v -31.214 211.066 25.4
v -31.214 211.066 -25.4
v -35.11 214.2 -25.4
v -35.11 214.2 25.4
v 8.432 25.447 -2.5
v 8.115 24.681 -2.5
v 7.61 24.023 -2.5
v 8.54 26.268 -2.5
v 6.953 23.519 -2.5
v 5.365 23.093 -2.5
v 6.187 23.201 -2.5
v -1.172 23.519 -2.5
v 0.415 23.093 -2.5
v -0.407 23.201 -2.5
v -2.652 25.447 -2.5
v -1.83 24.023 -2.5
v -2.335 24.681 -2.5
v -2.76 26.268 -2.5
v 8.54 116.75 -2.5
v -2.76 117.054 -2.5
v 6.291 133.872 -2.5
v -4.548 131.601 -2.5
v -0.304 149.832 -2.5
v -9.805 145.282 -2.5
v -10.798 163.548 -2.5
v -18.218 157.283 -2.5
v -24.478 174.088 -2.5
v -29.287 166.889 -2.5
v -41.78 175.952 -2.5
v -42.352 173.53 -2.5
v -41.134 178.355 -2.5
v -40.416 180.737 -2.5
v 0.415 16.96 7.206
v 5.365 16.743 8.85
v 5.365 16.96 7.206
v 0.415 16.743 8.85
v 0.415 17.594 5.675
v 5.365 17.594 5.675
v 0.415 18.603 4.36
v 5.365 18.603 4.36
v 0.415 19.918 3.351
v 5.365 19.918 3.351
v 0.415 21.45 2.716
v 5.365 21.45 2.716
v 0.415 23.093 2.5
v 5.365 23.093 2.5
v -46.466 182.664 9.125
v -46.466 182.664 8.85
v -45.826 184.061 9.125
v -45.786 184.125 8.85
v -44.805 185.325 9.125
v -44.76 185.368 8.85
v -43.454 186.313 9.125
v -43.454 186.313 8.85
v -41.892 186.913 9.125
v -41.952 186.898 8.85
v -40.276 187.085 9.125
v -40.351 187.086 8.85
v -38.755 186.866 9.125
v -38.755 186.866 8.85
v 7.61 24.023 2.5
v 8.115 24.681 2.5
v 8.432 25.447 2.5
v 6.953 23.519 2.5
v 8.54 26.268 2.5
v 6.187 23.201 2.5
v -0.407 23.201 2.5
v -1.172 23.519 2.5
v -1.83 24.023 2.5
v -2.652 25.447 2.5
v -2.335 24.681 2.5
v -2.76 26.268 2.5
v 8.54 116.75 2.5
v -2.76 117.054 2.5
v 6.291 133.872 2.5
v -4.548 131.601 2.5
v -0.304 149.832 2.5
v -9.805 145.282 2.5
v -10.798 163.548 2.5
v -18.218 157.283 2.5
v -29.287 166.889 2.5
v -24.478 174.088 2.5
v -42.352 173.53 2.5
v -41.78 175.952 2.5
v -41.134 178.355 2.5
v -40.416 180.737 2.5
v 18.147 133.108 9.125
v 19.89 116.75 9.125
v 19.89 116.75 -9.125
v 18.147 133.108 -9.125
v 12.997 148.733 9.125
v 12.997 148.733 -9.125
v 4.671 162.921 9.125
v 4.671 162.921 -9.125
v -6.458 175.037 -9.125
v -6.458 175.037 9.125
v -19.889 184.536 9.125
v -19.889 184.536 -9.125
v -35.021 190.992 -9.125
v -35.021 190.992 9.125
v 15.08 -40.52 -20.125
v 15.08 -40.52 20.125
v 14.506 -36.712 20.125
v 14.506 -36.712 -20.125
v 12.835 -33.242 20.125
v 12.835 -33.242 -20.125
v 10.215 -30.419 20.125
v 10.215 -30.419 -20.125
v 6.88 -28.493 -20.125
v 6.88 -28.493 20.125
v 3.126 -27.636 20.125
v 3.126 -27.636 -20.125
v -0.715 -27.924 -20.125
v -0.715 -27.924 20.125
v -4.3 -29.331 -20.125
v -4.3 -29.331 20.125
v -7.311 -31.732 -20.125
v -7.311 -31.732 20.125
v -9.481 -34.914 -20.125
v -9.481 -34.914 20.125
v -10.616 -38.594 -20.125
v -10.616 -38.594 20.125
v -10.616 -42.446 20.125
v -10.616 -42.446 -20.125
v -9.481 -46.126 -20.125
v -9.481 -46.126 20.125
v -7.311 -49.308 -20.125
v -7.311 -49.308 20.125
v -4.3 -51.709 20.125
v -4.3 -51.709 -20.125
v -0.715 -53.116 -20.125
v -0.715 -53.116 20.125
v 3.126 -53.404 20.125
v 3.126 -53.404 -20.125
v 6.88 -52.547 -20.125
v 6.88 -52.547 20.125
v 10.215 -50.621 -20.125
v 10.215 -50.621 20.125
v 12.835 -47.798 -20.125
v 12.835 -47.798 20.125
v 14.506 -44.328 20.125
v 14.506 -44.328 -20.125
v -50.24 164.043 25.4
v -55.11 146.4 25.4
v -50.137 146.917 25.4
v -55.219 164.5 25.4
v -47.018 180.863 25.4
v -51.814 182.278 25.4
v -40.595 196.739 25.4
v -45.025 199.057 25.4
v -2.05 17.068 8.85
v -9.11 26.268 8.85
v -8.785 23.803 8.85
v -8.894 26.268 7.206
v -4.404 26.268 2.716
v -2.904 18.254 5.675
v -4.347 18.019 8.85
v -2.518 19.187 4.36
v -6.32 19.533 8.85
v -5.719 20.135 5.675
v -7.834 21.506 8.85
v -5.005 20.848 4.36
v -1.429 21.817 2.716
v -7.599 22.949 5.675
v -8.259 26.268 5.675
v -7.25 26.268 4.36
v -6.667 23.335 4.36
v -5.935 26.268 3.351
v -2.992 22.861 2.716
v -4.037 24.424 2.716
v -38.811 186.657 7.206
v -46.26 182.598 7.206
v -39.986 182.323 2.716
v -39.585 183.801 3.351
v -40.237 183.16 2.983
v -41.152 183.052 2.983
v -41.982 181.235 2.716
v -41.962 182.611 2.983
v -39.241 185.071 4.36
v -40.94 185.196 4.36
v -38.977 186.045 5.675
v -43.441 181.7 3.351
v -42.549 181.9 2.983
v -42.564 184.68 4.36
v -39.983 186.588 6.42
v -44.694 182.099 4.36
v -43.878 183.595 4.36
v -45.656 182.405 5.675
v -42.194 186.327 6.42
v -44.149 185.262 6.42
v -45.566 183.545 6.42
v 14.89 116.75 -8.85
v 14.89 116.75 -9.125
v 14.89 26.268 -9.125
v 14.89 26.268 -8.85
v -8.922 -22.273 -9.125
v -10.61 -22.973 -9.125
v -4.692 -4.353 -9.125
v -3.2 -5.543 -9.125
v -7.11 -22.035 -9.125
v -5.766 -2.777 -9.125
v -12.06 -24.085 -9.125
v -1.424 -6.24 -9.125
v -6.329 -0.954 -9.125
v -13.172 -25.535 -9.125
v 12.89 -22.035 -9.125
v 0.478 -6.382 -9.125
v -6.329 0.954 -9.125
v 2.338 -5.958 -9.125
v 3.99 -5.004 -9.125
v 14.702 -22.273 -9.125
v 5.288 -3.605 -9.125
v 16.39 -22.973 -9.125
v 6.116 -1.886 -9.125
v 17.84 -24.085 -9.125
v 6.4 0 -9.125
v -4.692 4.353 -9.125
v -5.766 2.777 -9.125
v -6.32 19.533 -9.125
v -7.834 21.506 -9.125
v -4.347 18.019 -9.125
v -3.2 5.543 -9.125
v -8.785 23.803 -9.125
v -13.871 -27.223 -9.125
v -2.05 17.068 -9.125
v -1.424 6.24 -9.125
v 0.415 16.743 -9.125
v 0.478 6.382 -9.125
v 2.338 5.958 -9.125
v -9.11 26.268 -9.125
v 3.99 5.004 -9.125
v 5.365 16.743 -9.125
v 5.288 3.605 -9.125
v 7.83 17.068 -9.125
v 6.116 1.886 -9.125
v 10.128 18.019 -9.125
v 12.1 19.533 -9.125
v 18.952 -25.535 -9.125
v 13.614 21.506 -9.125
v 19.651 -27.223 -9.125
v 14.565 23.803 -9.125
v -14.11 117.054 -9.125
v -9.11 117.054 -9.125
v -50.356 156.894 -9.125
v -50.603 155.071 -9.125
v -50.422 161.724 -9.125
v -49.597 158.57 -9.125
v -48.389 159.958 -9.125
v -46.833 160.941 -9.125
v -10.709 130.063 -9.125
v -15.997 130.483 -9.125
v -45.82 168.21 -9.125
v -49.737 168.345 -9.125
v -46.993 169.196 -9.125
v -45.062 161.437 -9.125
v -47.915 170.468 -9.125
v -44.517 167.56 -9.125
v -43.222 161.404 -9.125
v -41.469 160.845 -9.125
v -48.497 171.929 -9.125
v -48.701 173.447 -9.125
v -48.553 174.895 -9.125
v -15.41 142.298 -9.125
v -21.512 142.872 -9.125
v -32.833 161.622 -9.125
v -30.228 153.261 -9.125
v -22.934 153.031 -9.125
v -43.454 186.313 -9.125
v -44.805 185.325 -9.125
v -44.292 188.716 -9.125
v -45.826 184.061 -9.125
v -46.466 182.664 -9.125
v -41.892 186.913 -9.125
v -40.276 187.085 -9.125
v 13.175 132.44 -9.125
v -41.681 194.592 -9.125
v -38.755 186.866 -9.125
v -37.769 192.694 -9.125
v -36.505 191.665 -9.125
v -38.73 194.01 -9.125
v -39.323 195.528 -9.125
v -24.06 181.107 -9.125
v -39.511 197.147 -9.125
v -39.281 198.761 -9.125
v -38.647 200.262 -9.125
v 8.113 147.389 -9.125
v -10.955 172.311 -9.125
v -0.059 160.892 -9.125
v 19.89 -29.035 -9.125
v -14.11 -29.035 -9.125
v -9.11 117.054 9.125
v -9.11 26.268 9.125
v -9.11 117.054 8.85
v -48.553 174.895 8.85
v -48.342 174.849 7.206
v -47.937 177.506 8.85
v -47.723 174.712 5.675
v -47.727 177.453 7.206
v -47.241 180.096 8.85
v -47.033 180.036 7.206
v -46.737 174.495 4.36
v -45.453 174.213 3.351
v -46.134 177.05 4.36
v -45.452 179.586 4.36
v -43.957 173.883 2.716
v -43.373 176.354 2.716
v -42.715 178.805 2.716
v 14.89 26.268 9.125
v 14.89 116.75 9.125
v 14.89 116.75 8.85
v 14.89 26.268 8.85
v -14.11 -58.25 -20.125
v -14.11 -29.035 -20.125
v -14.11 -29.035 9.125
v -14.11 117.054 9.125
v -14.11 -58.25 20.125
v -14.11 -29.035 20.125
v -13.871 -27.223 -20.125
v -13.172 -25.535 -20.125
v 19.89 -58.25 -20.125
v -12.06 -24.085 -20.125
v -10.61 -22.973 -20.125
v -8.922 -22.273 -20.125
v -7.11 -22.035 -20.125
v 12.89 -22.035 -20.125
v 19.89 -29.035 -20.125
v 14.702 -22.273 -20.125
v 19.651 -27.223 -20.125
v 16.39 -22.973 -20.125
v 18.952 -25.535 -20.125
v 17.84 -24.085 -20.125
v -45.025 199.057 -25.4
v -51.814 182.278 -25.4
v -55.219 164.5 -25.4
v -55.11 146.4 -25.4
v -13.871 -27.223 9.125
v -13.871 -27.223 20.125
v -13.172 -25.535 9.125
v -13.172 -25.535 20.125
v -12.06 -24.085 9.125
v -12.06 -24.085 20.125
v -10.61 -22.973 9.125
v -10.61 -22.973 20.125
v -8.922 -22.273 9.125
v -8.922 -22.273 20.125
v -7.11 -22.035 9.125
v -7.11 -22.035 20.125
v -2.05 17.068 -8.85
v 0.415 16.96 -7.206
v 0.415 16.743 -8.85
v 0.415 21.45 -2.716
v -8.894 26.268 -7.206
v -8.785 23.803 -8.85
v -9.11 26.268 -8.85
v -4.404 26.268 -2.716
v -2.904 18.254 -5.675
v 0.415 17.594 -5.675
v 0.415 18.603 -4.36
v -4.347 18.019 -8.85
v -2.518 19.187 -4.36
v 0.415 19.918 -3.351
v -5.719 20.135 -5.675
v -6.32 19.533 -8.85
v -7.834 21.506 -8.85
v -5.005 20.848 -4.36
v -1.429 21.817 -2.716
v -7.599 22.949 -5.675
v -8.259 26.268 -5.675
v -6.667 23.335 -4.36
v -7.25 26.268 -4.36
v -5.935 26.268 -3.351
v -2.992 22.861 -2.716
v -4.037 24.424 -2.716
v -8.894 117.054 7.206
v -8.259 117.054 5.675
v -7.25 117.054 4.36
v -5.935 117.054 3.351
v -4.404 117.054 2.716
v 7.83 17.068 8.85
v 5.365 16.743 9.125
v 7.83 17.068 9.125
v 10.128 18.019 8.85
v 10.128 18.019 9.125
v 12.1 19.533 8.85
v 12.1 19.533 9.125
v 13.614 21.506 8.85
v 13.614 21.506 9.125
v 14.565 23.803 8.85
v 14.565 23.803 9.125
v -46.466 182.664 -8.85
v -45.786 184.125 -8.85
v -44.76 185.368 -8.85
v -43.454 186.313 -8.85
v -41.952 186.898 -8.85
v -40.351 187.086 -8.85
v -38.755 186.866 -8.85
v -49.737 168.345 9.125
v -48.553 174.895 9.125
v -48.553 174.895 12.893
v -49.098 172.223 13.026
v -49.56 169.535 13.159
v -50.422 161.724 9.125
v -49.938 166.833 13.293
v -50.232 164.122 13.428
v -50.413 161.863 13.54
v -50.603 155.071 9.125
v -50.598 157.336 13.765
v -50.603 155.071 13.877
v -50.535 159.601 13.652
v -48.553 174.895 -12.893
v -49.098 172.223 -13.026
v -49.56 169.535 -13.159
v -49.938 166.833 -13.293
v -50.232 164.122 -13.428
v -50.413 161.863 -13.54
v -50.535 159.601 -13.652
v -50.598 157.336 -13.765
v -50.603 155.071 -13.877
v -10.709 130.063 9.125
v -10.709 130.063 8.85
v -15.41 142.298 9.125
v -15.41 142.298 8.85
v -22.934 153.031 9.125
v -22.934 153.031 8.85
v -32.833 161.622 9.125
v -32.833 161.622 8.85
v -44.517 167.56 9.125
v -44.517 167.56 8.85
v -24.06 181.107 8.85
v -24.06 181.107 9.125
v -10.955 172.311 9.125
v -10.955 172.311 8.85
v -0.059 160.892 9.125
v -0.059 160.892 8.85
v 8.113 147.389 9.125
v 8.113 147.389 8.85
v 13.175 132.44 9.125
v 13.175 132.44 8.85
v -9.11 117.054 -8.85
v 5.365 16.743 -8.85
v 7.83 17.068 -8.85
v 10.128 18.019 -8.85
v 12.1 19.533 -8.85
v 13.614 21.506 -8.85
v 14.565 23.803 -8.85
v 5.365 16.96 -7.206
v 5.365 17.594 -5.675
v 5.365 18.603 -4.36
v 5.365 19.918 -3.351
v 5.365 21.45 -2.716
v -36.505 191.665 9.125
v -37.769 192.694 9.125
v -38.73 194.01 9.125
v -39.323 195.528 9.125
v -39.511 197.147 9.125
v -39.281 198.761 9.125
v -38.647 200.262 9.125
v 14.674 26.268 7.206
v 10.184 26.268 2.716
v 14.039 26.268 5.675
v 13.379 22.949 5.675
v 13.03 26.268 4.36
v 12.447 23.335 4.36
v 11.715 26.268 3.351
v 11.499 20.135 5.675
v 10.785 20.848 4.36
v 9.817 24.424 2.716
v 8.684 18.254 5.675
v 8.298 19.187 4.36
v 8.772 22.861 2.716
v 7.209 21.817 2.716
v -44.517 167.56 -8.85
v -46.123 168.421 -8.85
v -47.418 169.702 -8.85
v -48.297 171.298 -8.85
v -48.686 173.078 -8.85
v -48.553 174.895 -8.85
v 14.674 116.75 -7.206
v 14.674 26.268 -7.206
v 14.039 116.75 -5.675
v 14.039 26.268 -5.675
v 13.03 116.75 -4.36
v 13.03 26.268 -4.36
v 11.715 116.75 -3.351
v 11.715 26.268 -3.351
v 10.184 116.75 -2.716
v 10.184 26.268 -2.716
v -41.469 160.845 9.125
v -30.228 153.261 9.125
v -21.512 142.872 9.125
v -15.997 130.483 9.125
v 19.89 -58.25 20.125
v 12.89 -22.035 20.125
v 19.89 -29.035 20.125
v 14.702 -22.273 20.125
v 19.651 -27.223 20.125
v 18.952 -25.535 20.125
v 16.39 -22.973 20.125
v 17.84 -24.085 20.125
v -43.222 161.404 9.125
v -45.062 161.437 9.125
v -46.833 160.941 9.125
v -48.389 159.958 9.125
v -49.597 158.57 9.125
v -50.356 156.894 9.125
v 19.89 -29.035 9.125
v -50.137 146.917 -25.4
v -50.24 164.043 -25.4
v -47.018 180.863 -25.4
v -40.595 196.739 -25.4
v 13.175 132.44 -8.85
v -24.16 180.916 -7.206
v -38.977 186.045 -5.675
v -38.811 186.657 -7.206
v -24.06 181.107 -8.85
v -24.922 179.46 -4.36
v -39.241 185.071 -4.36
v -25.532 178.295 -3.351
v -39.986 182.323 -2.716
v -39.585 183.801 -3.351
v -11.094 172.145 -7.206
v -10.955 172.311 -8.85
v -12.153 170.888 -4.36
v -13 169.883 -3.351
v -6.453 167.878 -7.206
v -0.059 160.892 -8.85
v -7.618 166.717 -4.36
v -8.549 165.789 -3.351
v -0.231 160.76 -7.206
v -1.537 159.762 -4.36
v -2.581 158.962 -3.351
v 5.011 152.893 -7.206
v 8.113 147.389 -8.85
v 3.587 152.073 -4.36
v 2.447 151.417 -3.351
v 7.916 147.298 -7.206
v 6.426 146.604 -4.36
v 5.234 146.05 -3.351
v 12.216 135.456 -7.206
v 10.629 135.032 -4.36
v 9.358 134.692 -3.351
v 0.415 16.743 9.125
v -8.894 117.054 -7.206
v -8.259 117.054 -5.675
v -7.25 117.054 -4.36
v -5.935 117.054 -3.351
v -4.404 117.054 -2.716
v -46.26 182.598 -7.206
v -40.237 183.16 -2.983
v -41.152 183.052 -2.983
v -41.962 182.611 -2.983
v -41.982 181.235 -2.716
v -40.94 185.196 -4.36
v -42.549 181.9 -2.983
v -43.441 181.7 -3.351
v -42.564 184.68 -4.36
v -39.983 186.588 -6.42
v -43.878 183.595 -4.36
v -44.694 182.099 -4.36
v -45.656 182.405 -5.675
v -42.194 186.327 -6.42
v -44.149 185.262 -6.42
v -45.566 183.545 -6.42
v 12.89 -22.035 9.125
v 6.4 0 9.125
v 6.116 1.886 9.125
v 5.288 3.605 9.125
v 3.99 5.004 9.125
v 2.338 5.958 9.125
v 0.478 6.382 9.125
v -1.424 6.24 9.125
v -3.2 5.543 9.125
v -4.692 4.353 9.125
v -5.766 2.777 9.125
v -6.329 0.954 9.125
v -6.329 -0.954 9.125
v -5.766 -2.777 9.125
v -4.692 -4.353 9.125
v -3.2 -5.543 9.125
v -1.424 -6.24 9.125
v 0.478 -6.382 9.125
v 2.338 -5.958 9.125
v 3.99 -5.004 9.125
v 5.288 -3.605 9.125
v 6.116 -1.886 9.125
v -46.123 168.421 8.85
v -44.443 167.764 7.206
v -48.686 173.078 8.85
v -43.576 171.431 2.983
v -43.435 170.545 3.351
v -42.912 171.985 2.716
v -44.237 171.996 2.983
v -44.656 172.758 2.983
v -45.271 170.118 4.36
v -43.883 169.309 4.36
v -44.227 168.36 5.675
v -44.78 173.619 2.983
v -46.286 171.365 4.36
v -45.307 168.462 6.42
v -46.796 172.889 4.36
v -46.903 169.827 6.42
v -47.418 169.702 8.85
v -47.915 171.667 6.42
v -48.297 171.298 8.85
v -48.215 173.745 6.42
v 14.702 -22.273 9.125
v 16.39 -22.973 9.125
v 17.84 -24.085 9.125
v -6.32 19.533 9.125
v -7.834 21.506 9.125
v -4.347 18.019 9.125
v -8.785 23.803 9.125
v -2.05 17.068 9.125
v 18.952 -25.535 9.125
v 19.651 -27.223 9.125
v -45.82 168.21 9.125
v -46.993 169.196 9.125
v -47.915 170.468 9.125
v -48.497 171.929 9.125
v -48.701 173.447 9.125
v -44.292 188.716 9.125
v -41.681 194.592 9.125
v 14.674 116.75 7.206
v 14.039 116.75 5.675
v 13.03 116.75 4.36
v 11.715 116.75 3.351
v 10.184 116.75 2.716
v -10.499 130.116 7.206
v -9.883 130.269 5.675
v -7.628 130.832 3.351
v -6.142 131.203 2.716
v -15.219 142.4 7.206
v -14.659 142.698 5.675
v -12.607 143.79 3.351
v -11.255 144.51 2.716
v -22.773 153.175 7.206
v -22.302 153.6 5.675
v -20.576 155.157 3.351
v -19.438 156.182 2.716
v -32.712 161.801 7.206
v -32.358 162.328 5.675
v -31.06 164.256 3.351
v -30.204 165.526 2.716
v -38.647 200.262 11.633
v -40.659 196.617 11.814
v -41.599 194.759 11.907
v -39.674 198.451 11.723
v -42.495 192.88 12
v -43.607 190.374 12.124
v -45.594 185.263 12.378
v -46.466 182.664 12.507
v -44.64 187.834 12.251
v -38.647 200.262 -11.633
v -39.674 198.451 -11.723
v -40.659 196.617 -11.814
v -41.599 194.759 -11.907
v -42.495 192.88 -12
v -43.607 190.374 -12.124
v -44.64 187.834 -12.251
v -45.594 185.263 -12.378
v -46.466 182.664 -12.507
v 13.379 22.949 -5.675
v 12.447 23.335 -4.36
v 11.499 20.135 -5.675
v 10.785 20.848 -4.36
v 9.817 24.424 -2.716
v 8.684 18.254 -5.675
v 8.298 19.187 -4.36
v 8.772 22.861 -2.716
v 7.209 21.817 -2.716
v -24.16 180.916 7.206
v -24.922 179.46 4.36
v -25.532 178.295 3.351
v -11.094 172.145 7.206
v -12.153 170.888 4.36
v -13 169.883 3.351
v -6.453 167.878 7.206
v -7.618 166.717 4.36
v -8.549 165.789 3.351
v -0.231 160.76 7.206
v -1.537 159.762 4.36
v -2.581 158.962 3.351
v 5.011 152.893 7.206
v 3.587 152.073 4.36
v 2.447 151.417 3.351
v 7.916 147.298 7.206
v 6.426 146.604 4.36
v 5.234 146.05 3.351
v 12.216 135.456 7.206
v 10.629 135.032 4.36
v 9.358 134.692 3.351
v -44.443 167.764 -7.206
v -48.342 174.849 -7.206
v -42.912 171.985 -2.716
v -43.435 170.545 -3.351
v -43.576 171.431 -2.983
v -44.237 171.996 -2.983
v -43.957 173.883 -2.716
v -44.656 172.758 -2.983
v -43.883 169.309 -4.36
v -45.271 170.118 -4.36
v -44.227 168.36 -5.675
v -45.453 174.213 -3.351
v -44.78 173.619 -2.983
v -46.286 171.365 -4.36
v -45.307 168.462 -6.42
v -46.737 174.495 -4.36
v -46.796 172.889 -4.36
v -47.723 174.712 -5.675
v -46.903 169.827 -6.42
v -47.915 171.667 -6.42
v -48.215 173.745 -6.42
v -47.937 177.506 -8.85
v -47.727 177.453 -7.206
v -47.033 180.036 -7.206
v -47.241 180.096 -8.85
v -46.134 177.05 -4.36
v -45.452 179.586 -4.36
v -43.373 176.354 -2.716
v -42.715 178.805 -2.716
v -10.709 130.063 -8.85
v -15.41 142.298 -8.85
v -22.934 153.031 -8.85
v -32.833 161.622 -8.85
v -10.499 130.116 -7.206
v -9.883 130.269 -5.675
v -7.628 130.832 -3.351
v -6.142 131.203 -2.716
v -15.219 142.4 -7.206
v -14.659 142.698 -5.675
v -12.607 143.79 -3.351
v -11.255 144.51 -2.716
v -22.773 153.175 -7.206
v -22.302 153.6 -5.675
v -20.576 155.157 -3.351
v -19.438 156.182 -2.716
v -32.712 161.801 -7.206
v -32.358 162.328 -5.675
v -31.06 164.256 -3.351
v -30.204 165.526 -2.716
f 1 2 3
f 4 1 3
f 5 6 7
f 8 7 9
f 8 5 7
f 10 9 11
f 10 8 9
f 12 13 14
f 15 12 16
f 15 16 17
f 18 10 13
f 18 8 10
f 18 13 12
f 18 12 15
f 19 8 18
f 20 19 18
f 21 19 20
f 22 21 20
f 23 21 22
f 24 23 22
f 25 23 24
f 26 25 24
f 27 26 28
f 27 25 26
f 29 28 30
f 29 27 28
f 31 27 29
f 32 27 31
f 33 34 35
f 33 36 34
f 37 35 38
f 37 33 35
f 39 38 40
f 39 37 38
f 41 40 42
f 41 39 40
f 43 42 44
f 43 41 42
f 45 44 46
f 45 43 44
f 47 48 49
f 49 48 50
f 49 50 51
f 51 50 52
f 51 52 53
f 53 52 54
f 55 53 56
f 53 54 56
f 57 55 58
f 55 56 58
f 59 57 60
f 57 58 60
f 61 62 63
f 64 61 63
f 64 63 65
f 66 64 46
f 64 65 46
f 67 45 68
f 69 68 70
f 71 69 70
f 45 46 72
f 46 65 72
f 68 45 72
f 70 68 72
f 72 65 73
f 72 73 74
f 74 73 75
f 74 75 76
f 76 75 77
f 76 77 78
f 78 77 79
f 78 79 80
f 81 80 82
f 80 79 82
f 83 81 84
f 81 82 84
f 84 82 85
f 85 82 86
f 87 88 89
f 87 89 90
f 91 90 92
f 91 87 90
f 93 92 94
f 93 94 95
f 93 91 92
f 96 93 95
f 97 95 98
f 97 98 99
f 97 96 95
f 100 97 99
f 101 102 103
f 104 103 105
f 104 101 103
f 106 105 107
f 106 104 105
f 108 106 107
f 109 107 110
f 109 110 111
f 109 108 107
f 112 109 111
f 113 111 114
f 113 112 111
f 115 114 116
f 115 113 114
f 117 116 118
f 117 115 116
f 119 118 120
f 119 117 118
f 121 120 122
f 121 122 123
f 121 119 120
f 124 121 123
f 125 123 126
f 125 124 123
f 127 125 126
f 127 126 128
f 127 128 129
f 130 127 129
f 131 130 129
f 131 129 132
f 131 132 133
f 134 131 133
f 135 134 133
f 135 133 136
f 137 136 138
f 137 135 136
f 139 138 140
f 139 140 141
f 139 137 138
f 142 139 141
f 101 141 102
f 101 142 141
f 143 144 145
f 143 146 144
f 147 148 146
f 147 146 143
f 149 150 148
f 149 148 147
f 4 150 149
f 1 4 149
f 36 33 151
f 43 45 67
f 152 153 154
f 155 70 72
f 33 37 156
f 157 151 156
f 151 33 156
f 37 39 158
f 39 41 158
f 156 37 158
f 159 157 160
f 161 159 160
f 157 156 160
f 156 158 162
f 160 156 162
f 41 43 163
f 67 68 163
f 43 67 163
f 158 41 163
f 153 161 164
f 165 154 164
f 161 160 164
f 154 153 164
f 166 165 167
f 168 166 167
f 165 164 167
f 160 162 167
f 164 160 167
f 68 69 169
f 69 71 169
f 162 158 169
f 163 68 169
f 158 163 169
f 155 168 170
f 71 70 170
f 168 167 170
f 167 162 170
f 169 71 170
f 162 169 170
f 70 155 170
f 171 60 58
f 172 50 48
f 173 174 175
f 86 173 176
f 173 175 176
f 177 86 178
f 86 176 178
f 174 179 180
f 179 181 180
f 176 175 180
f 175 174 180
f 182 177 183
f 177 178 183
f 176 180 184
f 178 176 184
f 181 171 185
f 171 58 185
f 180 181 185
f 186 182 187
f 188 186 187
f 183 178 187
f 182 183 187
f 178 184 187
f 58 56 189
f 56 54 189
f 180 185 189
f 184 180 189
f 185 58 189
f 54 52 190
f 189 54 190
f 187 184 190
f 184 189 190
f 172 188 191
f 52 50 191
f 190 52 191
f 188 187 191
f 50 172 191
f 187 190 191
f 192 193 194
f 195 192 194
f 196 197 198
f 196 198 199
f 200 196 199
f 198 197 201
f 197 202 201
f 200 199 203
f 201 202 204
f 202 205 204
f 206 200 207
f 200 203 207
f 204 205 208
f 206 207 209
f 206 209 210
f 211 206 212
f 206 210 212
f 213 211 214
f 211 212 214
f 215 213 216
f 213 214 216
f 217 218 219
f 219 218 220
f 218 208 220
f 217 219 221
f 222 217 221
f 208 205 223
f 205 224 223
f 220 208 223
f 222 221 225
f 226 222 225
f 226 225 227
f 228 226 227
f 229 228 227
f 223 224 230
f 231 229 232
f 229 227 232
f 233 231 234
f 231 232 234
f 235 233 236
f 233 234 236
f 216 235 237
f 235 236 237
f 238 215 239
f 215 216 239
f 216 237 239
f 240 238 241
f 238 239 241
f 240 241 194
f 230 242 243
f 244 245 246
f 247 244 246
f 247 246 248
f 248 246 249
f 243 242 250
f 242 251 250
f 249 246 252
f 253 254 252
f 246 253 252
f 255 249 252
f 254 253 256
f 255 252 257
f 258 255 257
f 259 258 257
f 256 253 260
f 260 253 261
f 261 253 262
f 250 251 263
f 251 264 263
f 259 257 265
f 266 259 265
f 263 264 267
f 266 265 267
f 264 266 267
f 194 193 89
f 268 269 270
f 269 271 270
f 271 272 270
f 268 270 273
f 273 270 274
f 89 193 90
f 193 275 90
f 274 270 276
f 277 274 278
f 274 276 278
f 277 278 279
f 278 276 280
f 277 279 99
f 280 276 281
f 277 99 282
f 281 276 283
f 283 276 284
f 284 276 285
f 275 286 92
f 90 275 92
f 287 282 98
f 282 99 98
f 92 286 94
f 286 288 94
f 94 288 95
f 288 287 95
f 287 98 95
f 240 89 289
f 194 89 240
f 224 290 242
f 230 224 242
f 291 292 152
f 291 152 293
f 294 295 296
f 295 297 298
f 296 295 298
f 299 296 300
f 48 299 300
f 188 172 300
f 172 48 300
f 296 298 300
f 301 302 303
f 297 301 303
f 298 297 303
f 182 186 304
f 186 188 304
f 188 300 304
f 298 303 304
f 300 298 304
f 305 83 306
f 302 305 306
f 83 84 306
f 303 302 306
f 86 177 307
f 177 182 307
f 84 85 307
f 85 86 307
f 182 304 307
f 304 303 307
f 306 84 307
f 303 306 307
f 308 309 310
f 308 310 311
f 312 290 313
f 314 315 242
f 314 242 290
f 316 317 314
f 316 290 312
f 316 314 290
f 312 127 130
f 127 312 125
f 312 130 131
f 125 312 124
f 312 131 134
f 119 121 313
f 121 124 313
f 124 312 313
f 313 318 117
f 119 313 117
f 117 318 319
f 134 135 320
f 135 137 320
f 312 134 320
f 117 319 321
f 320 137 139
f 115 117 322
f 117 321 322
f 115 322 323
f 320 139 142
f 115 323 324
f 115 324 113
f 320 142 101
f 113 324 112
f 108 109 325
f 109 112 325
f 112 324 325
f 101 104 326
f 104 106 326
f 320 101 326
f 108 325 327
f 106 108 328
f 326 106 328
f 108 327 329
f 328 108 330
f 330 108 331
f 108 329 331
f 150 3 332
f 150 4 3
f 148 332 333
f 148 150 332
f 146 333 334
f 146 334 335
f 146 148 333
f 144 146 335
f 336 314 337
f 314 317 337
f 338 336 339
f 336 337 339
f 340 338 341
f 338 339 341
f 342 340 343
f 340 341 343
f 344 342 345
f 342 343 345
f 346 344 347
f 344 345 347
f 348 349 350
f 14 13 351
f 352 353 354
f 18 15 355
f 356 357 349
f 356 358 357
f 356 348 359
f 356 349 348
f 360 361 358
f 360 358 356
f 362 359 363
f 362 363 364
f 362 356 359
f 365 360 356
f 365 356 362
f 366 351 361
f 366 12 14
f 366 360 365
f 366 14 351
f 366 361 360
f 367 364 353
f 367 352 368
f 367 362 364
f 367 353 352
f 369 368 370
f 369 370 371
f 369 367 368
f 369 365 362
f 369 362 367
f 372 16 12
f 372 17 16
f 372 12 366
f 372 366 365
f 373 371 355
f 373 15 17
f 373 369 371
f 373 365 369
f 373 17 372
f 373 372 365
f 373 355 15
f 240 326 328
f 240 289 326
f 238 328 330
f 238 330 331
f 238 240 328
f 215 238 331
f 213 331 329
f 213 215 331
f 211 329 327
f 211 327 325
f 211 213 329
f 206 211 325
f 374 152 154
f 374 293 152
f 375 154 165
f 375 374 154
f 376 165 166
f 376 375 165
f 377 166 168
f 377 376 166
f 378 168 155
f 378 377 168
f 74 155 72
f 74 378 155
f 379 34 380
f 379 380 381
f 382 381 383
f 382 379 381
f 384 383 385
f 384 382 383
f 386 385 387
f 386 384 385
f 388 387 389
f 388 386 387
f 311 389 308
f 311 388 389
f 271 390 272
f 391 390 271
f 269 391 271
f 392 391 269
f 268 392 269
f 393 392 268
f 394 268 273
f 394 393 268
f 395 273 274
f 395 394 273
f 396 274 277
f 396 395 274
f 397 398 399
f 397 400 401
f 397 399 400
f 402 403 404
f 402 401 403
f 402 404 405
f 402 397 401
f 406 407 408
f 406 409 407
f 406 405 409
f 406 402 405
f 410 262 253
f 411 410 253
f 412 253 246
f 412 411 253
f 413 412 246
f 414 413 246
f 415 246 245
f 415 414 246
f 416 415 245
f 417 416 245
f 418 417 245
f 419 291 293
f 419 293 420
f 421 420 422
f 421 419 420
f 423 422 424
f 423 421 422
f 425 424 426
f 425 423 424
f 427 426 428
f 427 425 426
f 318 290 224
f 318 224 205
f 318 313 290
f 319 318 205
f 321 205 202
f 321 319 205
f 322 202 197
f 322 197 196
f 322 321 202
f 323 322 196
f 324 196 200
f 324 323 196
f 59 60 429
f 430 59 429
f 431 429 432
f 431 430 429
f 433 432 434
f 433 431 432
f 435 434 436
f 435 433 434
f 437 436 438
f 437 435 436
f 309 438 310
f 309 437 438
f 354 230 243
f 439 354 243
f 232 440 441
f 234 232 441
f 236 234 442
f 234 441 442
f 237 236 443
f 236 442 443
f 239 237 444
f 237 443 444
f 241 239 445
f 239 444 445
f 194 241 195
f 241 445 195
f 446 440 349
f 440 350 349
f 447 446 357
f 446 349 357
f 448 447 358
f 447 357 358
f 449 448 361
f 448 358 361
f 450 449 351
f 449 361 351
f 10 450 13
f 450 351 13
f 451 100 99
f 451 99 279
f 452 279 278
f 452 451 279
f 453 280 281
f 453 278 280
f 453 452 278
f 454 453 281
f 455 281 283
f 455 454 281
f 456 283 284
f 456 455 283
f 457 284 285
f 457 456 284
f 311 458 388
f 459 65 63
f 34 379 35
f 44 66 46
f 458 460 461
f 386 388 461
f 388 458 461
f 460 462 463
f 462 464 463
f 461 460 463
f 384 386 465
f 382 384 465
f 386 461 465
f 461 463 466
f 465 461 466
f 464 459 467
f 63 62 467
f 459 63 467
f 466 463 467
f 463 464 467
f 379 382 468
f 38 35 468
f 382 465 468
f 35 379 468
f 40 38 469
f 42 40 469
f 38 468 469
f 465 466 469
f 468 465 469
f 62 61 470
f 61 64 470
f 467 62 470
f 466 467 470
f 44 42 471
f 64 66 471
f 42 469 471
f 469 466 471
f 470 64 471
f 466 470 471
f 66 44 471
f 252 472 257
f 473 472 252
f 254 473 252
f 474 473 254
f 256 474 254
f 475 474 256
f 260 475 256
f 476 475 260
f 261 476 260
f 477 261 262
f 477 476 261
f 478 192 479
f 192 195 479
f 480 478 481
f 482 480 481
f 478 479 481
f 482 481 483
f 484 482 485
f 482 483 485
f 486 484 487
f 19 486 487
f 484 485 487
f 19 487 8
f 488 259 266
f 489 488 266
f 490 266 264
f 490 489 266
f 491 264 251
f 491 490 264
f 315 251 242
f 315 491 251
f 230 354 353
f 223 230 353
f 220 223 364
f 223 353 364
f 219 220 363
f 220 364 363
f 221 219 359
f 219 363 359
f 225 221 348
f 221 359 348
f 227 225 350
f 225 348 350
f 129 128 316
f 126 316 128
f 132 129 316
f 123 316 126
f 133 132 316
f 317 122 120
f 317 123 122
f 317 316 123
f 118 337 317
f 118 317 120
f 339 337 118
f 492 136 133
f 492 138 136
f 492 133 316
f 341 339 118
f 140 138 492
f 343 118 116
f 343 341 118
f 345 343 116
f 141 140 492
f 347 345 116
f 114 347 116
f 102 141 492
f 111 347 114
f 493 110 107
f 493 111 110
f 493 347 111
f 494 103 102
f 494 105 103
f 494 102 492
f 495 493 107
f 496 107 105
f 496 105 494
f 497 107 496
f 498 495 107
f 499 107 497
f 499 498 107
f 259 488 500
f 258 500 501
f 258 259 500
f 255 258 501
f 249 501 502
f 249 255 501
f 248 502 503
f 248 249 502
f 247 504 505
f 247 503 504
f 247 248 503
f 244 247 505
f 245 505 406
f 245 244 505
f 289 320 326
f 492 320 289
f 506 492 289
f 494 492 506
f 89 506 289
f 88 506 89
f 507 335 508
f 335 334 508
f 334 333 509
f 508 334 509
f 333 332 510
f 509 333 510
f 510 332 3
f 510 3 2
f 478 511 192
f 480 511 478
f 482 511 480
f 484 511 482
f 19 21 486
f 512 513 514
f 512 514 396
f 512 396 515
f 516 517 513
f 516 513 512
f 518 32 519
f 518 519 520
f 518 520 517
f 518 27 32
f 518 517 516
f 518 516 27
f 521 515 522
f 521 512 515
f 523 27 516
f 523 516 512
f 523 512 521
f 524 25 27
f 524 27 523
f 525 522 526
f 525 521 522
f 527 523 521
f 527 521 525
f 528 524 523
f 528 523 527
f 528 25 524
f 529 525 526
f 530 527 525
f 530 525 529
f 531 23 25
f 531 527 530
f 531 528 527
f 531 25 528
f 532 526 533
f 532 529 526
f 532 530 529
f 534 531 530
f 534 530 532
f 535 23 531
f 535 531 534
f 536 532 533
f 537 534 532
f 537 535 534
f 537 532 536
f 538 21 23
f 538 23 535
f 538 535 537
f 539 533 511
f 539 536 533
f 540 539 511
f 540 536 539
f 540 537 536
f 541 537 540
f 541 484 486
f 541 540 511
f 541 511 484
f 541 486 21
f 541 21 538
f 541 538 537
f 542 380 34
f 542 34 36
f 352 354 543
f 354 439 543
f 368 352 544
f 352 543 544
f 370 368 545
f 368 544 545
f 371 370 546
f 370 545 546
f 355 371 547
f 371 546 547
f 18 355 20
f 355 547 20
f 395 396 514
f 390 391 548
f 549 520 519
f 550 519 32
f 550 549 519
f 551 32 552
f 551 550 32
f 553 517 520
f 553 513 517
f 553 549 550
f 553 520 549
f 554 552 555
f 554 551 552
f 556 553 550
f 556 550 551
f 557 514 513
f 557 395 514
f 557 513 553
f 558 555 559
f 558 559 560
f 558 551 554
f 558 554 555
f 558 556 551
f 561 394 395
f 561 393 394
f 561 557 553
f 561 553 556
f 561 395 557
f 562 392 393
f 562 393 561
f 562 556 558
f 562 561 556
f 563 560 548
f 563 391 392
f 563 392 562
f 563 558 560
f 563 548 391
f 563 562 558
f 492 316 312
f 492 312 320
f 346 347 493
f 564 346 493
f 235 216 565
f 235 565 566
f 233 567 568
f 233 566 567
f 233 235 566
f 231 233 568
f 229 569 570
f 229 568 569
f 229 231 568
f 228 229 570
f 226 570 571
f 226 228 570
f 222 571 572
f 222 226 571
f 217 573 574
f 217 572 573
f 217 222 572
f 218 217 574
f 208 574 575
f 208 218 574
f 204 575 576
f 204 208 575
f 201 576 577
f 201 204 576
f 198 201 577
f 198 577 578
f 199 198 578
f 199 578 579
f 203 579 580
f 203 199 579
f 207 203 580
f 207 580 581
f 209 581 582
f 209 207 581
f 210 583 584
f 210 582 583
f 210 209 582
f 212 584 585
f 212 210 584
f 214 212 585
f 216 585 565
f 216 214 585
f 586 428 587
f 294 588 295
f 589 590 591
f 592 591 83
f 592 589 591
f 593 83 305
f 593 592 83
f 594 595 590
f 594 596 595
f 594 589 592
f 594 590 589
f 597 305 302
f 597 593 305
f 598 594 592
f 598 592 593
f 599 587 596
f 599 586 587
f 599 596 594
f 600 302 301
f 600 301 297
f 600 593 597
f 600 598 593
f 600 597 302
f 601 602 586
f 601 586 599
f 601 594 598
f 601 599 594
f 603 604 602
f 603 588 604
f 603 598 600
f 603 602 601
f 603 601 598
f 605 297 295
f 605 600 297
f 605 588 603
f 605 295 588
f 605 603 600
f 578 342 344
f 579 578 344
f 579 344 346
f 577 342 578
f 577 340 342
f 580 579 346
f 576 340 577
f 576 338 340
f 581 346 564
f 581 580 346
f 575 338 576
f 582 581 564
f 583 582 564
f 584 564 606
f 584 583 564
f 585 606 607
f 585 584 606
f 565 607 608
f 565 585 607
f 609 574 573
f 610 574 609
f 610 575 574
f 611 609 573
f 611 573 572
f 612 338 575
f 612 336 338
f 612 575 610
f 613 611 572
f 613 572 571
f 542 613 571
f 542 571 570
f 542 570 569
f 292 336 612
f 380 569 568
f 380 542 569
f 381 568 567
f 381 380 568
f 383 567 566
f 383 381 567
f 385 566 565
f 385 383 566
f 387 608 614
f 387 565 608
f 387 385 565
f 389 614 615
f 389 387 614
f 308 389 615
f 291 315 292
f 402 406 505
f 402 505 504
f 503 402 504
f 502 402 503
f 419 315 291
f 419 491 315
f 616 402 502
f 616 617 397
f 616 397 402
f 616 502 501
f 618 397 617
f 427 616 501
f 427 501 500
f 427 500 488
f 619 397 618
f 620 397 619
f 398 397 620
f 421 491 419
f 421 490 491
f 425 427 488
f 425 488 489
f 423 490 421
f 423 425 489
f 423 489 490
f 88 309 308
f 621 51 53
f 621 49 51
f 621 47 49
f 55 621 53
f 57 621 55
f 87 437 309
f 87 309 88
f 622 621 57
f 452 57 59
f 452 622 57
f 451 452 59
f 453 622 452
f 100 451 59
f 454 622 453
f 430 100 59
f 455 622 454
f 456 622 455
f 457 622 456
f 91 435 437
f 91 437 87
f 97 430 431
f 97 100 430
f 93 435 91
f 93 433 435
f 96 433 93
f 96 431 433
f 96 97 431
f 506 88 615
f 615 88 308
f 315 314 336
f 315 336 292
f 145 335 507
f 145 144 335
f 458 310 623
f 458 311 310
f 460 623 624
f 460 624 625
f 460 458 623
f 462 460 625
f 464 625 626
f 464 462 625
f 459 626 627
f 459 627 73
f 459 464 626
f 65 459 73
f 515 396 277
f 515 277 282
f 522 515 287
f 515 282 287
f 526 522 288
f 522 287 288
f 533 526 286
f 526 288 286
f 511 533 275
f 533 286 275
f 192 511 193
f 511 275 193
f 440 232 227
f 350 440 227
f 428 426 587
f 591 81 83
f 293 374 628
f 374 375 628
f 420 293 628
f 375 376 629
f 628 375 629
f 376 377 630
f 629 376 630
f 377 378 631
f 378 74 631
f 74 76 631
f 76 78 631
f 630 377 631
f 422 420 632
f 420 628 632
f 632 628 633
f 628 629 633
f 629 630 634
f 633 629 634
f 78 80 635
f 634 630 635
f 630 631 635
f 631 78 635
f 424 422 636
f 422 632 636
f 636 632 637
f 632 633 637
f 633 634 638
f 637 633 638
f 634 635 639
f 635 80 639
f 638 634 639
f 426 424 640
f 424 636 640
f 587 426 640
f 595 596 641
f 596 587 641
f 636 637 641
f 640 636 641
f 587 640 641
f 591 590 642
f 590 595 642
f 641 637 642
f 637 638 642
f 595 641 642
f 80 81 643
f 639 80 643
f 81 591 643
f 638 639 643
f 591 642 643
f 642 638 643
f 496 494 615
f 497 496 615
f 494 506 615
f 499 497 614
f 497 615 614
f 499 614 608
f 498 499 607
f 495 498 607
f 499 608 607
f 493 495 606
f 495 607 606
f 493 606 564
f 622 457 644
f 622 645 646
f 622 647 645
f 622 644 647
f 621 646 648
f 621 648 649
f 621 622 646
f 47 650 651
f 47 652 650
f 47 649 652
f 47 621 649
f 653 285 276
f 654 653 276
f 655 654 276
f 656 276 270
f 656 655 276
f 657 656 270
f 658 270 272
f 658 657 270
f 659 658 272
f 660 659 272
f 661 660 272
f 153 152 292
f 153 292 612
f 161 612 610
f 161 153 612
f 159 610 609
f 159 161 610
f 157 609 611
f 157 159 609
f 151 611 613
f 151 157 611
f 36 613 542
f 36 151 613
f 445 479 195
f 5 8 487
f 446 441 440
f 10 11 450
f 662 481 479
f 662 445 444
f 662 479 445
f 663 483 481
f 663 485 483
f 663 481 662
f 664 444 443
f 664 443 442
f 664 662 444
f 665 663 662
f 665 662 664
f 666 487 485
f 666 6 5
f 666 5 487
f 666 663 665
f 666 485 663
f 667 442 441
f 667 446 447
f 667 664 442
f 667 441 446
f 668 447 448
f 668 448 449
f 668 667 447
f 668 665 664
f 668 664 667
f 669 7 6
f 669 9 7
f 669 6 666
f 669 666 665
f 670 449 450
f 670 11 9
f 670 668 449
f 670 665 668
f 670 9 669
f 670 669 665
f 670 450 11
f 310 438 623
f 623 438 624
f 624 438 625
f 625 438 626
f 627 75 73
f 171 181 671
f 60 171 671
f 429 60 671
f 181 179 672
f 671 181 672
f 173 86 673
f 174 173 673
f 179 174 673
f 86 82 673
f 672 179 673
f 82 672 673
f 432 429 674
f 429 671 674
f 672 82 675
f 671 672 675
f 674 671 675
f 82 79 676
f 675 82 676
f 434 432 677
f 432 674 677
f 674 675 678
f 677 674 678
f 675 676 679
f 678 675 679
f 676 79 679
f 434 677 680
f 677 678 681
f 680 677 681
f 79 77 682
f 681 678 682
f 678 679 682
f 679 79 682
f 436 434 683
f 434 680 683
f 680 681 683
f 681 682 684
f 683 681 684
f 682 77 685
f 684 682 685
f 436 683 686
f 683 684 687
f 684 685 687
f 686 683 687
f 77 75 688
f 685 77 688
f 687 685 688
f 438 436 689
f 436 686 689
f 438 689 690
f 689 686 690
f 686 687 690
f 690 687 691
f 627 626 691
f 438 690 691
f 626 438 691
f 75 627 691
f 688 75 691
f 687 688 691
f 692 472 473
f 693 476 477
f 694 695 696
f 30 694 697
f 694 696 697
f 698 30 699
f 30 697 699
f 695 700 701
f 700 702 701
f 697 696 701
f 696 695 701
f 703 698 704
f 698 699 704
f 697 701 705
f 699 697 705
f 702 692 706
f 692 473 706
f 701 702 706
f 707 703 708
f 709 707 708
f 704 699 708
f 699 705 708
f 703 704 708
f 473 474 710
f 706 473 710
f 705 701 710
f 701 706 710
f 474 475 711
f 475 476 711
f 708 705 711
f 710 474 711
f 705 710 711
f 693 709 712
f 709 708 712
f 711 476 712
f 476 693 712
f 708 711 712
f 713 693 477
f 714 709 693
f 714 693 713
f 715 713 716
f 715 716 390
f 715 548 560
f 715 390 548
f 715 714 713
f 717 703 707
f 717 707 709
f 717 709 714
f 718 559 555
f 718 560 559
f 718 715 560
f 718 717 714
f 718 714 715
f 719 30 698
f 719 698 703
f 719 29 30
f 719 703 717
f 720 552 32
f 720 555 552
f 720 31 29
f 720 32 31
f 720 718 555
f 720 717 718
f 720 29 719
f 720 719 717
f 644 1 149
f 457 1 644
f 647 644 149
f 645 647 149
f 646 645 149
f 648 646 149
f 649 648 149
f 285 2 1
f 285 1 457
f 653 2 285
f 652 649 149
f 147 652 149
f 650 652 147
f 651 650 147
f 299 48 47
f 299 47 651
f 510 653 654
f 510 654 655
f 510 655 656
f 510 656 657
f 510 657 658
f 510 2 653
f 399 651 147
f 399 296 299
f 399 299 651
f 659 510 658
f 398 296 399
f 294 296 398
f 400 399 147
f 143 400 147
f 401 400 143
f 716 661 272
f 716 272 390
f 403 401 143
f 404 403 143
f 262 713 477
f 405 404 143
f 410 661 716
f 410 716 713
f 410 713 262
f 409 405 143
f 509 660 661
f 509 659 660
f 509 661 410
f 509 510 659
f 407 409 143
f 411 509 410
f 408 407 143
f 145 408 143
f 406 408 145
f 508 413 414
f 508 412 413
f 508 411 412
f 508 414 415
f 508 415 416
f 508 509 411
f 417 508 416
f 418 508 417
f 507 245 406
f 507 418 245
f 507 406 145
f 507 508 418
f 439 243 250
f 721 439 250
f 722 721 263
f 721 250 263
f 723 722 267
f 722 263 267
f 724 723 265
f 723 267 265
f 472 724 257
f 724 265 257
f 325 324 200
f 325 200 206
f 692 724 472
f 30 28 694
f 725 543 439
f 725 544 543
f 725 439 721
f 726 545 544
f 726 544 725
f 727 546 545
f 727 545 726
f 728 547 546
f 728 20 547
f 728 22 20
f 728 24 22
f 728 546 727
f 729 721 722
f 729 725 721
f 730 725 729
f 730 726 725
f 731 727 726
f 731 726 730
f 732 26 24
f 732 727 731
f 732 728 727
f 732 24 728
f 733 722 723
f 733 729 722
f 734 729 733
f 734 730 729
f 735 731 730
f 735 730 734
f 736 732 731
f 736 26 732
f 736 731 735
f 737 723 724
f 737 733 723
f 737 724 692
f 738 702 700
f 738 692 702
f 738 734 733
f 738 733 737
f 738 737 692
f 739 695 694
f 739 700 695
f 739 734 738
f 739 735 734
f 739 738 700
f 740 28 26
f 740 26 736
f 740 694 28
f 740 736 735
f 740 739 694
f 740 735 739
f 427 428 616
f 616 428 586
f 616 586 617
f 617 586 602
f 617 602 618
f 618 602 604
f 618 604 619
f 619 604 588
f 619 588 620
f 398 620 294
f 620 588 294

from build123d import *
from build123d.topology import SkipClean

# Parameters (mm, degrees)
SKETCH2_R               = 6.3999999999999995
SKETCH2_R_2             = 12.920000000000002
BOSS_EXTRUDE1_DEPTH     = 20.125
BOSS_EXTRUDE2_DEPTH     = 25.4
CUT_EXTRUDE1_DEPTH      = 17.625
FILLET2_R               = 9.525
FILLET1_R               = 6.35
FILLET2_OF_MIRROR1_R    = 9.525
FILLET1_OF_MIRROR1_R    = 6.35
CUT_EXTRUDE3_REACH      = 230.532
CUT_EXTRUDE3_END_RADIUS = 87.85596312436087
CUT_EXTRUDE4_DEPTH      = 34
FILLET3_R               = 6.35
CUT_EXTRUDE6_DEPTH      = 11
FILLET4_R               = 7


with BuildPart() as part:
    # Sketch2 → Boss-Extrude1 (new, symmetric)
    with BuildSketch(Plane.XY):
        with BuildLine():
            Line((-14.110000000000005, 117.05420999809479), (-14.110000000000003, 39.41472795492869))
            Line((-14.110000000000003, 39.41472795492869), (-14.109999999999992, -58.249999999999986))
            Line((-14.109999999999992, -58.24999999999999), (19.890000000000008, -58.24999999999999))
            Line((19.89000000000001, -58.24999999999999), (19.89000000000001, 39.414727954928686))
            Line((19.89000000000001, 39.41472795492869), (19.89000000000001, 116.74999999999999))
            ThreePointArc((19.890000000000022, 116.74999999999999), (2.3016026864285166, 165.96310053609741), (-42.49516565662927, 192.88020532941604))
            ThreePointArc((-42.49516565662924, 192.88020532941601), (-47.59126491681772, 178.8312081202326), (-50.2324931256602, 164.12173961174625))
            ThreePointArc((-50.23249312566025, 164.12173961174625), (-24.181503081041093, 146.71979128999487), (-14.110000000000007, 117.05420999809479))
        make_face()
        Circle(SKETCH2_R, mode=Mode.SUBTRACT)
        with Locations((2.160000000000005, -40.52)):
            Circle(SKETCH2_R_2, mode=Mode.SUBTRACT)
    extrude(amount=BOSS_EXTRUDE1_DEPTH, both=True)

    # Sketch2<3> → Boss-Extrude2 (add, symmetric)
    with BuildSketch(Plane.XY):
        with BuildLine():
            Line((-55.11000000000002, 146.4), (-50.13682514315135, 146.9172348047148))
            ThreePointArc((-50.13682514315135, 146.9172348047148), (-47.01837422138325, 180.86294224819565), (-31.213761902356293, 211.06641919101017))
            Line((-31.213761902356293, 211.06641919101017), (-35.11000000000003, 214.2))
            ThreePointArc((-35.11000000000003, 214.2), (-51.814073878435075, 182.27760291399264), (-55.11000000000002, 146.4))
        make_face()
    extrude(amount=BOSS_EXTRUDE2_DEPTH, both=True)

    # Sketch3 → Cut-Extrude1 (cut)
    with BuildSketch(Plane.XY.offset(20.125)):
        with BuildLine():
            Line((-9.109999999999992, 16.74326446705436), (-9.110000000000003, 117.05420999809479))
            ThreePointArc((-9.110000000000003, 117.05420999809479), (-20.430838112311193, 150.0432736077851), (-49.62239933784868, 169.12972028140788))
            ThreePointArc((-49.62239933784868, 169.12972028140788), (-47.60047450986274, 178.79694990145757), (-44.50629280792827, 188.17615819065796))
            ThreePointArc((-44.50629280792827, 188.17615819065796), (-1.899187077854016, 163.1978623652425), (14.890000000000011, 116.74999999999999))
            Line((14.890000000000011, 116.74999999999999), (14.890000000000011, 16.74326446705436))
            Line((14.890000000000011, 16.74326446705436), (-9.109999999999992, 16.74326446705436))
        make_face()
    cut_extrude1 = extrude(amount=-CUT_EXTRUDE1_DEPTH, mode=Mode.SUBTRACT)

    # Fillet2
    fillet2_edges = [part.edges().sort_by_distance(p)[0] for p in [
        (14.890000000000011, 16.74326446705436, 11.3125),
        (-9.109999999999992, 16.74326446705436, 11.3125),
    ]]
    fillet(fillet2_edges, radius=FILLET2_R)

    # Fillet1
    fillet1_edges = [part.edges().sort_by_distance(p)[0] for p in [
        (-20.430838112311193, 150.0432736077851, 2.5),
        (-47.600474509862764, 178.79694990145757, 2.5),
        (-49.62239933784869, 169.12972028140788, 11.3125),
        (-1.8991870778540232, 163.1978623652425, 2.5),
        (-44.506292807928276, 188.17615819065796, 11.3125),
        (-9.109999999999998, 71.66123723257456, 2.5),
        (2.8900000000000112, 16.74326446705436, 2.5),
        (14.890000000000011, 71.50913223352717, 2.5),
        (12.100192090801878, 19.53307237625249, 2.5),
        (-6.32019209080186, 19.53307237625249, 2.5),
    ]]
    fillet(fillet1_edges, radius=FILLET1_R)

    # Mirror1: Cut-Extrude1 across plane
    add(cut_extrude1.mirror(Plane.XY), mode=Mode.SUBTRACT)

    # Fillet2 of Mirror1
    fillet2_of_mirror1_edges = [part.edges().sort_by_distance(p)[0] for p in [
        (14.890000000000011, 16.74326446705436, -11.3125),
        (-9.109999999999992, 16.74326446705436, -11.3125),
    ]]
    fillet(fillet2_of_mirror1_edges, radius=FILLET2_OF_MIRROR1_R)

    # Fillet1 of Mirror1
    fillet1_of_mirror1_edges = [part.edges().sort_by_distance(p)[0] for p in [
        (-20.430838112311193, 150.0432736077851, -2.5),
        (-47.600474509862764, 178.79694990145757, -2.5),
        (-49.62239933784869, 169.12972028140788, -11.3125),
        (-1.8991870778540232, 163.1978623652425, -2.5),
        (-44.506292807928276, 188.17615819065796, -11.3125),
        (-9.109999999999998, 71.66123723257456, -2.5),
        (2.8900000000000112, 16.74326446705436, -2.5),
        (14.890000000000011, 71.50913223352717, -2.5),
        (12.100192090801878, 19.53307237625249, -2.5),
        (-6.32019209080186, 19.53307237625249, -2.5),
    ]]
    fillet(fillet1_of_mirror1_edges, radius=FILLET1_OF_MIRROR1_R)

    # Cut-Extrude3: up to this cylinder (the profile starts inside it)
    with SkipClean():  # the faces are left unmerged after this step: merging them gives an invalid solid
        cut_extrude3_end = Plane(origin=(37.24778822370744, 156.0056671906468, 17.416667), z_dir=(0, 0, -1)) * Cylinder(CUT_EXTRUDE3_END_RADIUS, 637.7759262487218, mode=Mode.PRIVATE)
        # Sketch5 → Cut-Extrude3 (cut, up to the surface)
        with BuildSketch(Plane(origin=(19.89000000000001, 0, 0), x_dir=(0, 0, -1), z_dir=(1, 0, 0)), mode=Mode.PRIVATE) as cut_extrude3_sk1:
            Polygon((-20.125, 29.25), (-12, 192.88020532941607), (-20.125, 192.88020532941607), align=None)
        cut_extrude3_tool1 = extrude(cut_extrude3_sk1.sketch, amount=-CUT_EXTRUDE3_REACH, mode=Mode.PRIVATE) & cut_extrude3_end
        cut_extrude3 = cut_extrude3_tool1.solids().sort_by_distance((19.89, 138.336804, 17.416667))[0]
        add(cut_extrude3, mode=Mode.SUBTRACT)

    # Sketch5<2> → Cut-Extrude4 (cut)
    with SkipClean():  # the faces are left unmerged after this step: merging them gives an invalid solid
        with BuildSketch(Plane(origin=(19.89000000000001, 0, 0), x_dir=(0, 0, -1), z_dir=(1, 0, 0))):
            Polygon((-20.125, 29.25), (-12, 192.88020532941607), (-20.125, 192.88020532941607), align=None)
        cut_extrude4 = extrude(amount=-CUT_EXTRUDE4_DEPTH, mode=Mode.SUBTRACT)

    # Mirror3: Cut-Extrude3, Cut-Extrude4 across plane
    with SkipClean():  # the faces are left unmerged after this step: merging them gives an invalid solid
        add(cut_extrude3.mirror(Plane.XY), mode=Mode.SUBTRACT)
        add(cut_extrude4.mirror(Plane.XY), mode=Mode.SUBTRACT)

    # Fillet3
    # the kernel refuses this fillet: 6.35 mm, written as the material it adds along each edge
    with BuildSketch(Plane(origin=(-42.49516565662923, 192.88020532941607, 32.81193482848439), x_dir=(0.9695328883801022, -0.24496117722883434, 0), z_dir=(0, 0, -1))) as fillet3_piece_1_section:
        with BuildLine():
            CenterArc((8.024480114111293, -6.3421701367020615), FILLET3_R, 92.84559109505132, 103.22260019601504)
            ThreePointArc((1.922555805727569, -8.099730871002809), (0.8652879633419357, -4.072649651231302), (0, 0))
            ThreePointArc((0, 0), (3.854618709259254, -0.0957393715417783), (7.709237418518542, 1.1e-16))
        make_face()
    fillet3_piece_1 = extrude(amount=65.62386965696876, mode=Mode.PRIVATE)
    fillet3_piece_1 = split(fillet3_piece_1, bisect_by=Plane(origin=(-39.886829020293874, 194.82853980671922, 11.903256140293786), z_dir=(0, -0.04959354560053897, -0.9987694830313786)), keep=Keep.TOP, mode=Mode.PRIVATE)
    fillet3_piece_1 = split(fillet3_piece_1, bisect_by=Plane(origin=(-39.886829020293874, 194.82853980671922, -11.903256140293786), z_dir=(0, -0.04959354560053897, 0.9987694830313786)), keep=Keep.TOP, mode=Mode.PRIVATE)
    add(fillet3_piece_1)
    with BuildSketch(Plane(origin=(-50.2324931256602, 164.12173961174625, -36.817821832007795), x_dir=(0.9366748288378645, -0.3502003212756337, 0), z_dir=(0, 0, 1))) as fillet3_piece_2_section:
        with BuildLine():
            CenterArc((8.74629308675495, -6.320667702743433), FILLET3_R, 84.49076719702147, 116.61848813582492)
            ThreePointArc((2.822407485998928, -8.607604385110362), (1.3001924139031467, -4.340202472151455), (0, 0))
            ThreePointArc((0, 0), (4.6779660766656175, 0.2250766052239502), (9.355932153331263, 2.8e-16))
        make_face()
    fillet3_piece_2 = extrude(amount=73.63564366401559, mode=Mode.PRIVATE)
    fillet3_piece_2 = split(fillet3_piece_2, bisect_by=Plane(origin=(-48.29188317260997, 162.0247617991737, 13.532116140650901), z_dir=(0, -0.04959354560053897, -0.9987694830313786)), keep=Keep.TOP, mode=Mode.PRIVATE)
    fillet3_piece_2 = split(fillet3_piece_2, bisect_by=Plane(origin=(-48.29188317260997, 162.02476179917375, -13.5321161406509), z_dir=(0, -0.04959354560053897, 0.9987694830313786)), keep=Keep.TOP, mode=Mode.PRIVATE)
    add(fillet3_piece_2)

    # Sketch7 → Cut-Extrude6 (cut)
    with SkipClean():  # the faces are left unmerged after this step: merging them gives an invalid solid
        with BuildSketch(Plane.XY.offset(20.125)):
            with BuildLine():
                Line((-22.47666315598992, -22.034869971016057), (33.32085672898189, -22.034869971016057))
                Line((33.32085672898189, -22.034869971016057), (33.32085672898189, 196.87887338600035))
                Line((33.32085672898189, 196.87887338600035), (-31.213761902356293, 211.06641919101017))
                ThreePointArc((-31.213761902356293, 211.06641919101017), (-47.01837422138329, 180.8629422481957), (-50.13682514315135, 146.9172348047148))
                Line((-50.13682514315135, 146.9172348047148), (-22.47666315598992, -22.034869971016057))
            make_face()
        cut_extrude6 = extrude(amount=-CUT_EXTRUDE6_DEPTH, mode=Mode.SUBTRACT)

    # Mirror4: Cut-Extrude6 across plane
    with SkipClean():  # the faces are left unmerged after this step: merging them gives an invalid solid
        add(cut_extrude6.mirror(Plane.XY), mode=Mode.SUBTRACT)

    # Fillet4
    fillet4_edges = [part.edges().sort_by_distance(p)[0] for p in [
        (-14.110000000000001, -22.03486997101606, 14.625),
        (19.89000000000001, -22.034869971016057, 14.625),
        (19.89000000000001, -22.034869971016057, -14.625),
        (-14.110000000000001, -22.03486997101606, -14.625),
    ]]
    fillet(fillet4_edges, radius=FILLET4_R)


solid = part.part
